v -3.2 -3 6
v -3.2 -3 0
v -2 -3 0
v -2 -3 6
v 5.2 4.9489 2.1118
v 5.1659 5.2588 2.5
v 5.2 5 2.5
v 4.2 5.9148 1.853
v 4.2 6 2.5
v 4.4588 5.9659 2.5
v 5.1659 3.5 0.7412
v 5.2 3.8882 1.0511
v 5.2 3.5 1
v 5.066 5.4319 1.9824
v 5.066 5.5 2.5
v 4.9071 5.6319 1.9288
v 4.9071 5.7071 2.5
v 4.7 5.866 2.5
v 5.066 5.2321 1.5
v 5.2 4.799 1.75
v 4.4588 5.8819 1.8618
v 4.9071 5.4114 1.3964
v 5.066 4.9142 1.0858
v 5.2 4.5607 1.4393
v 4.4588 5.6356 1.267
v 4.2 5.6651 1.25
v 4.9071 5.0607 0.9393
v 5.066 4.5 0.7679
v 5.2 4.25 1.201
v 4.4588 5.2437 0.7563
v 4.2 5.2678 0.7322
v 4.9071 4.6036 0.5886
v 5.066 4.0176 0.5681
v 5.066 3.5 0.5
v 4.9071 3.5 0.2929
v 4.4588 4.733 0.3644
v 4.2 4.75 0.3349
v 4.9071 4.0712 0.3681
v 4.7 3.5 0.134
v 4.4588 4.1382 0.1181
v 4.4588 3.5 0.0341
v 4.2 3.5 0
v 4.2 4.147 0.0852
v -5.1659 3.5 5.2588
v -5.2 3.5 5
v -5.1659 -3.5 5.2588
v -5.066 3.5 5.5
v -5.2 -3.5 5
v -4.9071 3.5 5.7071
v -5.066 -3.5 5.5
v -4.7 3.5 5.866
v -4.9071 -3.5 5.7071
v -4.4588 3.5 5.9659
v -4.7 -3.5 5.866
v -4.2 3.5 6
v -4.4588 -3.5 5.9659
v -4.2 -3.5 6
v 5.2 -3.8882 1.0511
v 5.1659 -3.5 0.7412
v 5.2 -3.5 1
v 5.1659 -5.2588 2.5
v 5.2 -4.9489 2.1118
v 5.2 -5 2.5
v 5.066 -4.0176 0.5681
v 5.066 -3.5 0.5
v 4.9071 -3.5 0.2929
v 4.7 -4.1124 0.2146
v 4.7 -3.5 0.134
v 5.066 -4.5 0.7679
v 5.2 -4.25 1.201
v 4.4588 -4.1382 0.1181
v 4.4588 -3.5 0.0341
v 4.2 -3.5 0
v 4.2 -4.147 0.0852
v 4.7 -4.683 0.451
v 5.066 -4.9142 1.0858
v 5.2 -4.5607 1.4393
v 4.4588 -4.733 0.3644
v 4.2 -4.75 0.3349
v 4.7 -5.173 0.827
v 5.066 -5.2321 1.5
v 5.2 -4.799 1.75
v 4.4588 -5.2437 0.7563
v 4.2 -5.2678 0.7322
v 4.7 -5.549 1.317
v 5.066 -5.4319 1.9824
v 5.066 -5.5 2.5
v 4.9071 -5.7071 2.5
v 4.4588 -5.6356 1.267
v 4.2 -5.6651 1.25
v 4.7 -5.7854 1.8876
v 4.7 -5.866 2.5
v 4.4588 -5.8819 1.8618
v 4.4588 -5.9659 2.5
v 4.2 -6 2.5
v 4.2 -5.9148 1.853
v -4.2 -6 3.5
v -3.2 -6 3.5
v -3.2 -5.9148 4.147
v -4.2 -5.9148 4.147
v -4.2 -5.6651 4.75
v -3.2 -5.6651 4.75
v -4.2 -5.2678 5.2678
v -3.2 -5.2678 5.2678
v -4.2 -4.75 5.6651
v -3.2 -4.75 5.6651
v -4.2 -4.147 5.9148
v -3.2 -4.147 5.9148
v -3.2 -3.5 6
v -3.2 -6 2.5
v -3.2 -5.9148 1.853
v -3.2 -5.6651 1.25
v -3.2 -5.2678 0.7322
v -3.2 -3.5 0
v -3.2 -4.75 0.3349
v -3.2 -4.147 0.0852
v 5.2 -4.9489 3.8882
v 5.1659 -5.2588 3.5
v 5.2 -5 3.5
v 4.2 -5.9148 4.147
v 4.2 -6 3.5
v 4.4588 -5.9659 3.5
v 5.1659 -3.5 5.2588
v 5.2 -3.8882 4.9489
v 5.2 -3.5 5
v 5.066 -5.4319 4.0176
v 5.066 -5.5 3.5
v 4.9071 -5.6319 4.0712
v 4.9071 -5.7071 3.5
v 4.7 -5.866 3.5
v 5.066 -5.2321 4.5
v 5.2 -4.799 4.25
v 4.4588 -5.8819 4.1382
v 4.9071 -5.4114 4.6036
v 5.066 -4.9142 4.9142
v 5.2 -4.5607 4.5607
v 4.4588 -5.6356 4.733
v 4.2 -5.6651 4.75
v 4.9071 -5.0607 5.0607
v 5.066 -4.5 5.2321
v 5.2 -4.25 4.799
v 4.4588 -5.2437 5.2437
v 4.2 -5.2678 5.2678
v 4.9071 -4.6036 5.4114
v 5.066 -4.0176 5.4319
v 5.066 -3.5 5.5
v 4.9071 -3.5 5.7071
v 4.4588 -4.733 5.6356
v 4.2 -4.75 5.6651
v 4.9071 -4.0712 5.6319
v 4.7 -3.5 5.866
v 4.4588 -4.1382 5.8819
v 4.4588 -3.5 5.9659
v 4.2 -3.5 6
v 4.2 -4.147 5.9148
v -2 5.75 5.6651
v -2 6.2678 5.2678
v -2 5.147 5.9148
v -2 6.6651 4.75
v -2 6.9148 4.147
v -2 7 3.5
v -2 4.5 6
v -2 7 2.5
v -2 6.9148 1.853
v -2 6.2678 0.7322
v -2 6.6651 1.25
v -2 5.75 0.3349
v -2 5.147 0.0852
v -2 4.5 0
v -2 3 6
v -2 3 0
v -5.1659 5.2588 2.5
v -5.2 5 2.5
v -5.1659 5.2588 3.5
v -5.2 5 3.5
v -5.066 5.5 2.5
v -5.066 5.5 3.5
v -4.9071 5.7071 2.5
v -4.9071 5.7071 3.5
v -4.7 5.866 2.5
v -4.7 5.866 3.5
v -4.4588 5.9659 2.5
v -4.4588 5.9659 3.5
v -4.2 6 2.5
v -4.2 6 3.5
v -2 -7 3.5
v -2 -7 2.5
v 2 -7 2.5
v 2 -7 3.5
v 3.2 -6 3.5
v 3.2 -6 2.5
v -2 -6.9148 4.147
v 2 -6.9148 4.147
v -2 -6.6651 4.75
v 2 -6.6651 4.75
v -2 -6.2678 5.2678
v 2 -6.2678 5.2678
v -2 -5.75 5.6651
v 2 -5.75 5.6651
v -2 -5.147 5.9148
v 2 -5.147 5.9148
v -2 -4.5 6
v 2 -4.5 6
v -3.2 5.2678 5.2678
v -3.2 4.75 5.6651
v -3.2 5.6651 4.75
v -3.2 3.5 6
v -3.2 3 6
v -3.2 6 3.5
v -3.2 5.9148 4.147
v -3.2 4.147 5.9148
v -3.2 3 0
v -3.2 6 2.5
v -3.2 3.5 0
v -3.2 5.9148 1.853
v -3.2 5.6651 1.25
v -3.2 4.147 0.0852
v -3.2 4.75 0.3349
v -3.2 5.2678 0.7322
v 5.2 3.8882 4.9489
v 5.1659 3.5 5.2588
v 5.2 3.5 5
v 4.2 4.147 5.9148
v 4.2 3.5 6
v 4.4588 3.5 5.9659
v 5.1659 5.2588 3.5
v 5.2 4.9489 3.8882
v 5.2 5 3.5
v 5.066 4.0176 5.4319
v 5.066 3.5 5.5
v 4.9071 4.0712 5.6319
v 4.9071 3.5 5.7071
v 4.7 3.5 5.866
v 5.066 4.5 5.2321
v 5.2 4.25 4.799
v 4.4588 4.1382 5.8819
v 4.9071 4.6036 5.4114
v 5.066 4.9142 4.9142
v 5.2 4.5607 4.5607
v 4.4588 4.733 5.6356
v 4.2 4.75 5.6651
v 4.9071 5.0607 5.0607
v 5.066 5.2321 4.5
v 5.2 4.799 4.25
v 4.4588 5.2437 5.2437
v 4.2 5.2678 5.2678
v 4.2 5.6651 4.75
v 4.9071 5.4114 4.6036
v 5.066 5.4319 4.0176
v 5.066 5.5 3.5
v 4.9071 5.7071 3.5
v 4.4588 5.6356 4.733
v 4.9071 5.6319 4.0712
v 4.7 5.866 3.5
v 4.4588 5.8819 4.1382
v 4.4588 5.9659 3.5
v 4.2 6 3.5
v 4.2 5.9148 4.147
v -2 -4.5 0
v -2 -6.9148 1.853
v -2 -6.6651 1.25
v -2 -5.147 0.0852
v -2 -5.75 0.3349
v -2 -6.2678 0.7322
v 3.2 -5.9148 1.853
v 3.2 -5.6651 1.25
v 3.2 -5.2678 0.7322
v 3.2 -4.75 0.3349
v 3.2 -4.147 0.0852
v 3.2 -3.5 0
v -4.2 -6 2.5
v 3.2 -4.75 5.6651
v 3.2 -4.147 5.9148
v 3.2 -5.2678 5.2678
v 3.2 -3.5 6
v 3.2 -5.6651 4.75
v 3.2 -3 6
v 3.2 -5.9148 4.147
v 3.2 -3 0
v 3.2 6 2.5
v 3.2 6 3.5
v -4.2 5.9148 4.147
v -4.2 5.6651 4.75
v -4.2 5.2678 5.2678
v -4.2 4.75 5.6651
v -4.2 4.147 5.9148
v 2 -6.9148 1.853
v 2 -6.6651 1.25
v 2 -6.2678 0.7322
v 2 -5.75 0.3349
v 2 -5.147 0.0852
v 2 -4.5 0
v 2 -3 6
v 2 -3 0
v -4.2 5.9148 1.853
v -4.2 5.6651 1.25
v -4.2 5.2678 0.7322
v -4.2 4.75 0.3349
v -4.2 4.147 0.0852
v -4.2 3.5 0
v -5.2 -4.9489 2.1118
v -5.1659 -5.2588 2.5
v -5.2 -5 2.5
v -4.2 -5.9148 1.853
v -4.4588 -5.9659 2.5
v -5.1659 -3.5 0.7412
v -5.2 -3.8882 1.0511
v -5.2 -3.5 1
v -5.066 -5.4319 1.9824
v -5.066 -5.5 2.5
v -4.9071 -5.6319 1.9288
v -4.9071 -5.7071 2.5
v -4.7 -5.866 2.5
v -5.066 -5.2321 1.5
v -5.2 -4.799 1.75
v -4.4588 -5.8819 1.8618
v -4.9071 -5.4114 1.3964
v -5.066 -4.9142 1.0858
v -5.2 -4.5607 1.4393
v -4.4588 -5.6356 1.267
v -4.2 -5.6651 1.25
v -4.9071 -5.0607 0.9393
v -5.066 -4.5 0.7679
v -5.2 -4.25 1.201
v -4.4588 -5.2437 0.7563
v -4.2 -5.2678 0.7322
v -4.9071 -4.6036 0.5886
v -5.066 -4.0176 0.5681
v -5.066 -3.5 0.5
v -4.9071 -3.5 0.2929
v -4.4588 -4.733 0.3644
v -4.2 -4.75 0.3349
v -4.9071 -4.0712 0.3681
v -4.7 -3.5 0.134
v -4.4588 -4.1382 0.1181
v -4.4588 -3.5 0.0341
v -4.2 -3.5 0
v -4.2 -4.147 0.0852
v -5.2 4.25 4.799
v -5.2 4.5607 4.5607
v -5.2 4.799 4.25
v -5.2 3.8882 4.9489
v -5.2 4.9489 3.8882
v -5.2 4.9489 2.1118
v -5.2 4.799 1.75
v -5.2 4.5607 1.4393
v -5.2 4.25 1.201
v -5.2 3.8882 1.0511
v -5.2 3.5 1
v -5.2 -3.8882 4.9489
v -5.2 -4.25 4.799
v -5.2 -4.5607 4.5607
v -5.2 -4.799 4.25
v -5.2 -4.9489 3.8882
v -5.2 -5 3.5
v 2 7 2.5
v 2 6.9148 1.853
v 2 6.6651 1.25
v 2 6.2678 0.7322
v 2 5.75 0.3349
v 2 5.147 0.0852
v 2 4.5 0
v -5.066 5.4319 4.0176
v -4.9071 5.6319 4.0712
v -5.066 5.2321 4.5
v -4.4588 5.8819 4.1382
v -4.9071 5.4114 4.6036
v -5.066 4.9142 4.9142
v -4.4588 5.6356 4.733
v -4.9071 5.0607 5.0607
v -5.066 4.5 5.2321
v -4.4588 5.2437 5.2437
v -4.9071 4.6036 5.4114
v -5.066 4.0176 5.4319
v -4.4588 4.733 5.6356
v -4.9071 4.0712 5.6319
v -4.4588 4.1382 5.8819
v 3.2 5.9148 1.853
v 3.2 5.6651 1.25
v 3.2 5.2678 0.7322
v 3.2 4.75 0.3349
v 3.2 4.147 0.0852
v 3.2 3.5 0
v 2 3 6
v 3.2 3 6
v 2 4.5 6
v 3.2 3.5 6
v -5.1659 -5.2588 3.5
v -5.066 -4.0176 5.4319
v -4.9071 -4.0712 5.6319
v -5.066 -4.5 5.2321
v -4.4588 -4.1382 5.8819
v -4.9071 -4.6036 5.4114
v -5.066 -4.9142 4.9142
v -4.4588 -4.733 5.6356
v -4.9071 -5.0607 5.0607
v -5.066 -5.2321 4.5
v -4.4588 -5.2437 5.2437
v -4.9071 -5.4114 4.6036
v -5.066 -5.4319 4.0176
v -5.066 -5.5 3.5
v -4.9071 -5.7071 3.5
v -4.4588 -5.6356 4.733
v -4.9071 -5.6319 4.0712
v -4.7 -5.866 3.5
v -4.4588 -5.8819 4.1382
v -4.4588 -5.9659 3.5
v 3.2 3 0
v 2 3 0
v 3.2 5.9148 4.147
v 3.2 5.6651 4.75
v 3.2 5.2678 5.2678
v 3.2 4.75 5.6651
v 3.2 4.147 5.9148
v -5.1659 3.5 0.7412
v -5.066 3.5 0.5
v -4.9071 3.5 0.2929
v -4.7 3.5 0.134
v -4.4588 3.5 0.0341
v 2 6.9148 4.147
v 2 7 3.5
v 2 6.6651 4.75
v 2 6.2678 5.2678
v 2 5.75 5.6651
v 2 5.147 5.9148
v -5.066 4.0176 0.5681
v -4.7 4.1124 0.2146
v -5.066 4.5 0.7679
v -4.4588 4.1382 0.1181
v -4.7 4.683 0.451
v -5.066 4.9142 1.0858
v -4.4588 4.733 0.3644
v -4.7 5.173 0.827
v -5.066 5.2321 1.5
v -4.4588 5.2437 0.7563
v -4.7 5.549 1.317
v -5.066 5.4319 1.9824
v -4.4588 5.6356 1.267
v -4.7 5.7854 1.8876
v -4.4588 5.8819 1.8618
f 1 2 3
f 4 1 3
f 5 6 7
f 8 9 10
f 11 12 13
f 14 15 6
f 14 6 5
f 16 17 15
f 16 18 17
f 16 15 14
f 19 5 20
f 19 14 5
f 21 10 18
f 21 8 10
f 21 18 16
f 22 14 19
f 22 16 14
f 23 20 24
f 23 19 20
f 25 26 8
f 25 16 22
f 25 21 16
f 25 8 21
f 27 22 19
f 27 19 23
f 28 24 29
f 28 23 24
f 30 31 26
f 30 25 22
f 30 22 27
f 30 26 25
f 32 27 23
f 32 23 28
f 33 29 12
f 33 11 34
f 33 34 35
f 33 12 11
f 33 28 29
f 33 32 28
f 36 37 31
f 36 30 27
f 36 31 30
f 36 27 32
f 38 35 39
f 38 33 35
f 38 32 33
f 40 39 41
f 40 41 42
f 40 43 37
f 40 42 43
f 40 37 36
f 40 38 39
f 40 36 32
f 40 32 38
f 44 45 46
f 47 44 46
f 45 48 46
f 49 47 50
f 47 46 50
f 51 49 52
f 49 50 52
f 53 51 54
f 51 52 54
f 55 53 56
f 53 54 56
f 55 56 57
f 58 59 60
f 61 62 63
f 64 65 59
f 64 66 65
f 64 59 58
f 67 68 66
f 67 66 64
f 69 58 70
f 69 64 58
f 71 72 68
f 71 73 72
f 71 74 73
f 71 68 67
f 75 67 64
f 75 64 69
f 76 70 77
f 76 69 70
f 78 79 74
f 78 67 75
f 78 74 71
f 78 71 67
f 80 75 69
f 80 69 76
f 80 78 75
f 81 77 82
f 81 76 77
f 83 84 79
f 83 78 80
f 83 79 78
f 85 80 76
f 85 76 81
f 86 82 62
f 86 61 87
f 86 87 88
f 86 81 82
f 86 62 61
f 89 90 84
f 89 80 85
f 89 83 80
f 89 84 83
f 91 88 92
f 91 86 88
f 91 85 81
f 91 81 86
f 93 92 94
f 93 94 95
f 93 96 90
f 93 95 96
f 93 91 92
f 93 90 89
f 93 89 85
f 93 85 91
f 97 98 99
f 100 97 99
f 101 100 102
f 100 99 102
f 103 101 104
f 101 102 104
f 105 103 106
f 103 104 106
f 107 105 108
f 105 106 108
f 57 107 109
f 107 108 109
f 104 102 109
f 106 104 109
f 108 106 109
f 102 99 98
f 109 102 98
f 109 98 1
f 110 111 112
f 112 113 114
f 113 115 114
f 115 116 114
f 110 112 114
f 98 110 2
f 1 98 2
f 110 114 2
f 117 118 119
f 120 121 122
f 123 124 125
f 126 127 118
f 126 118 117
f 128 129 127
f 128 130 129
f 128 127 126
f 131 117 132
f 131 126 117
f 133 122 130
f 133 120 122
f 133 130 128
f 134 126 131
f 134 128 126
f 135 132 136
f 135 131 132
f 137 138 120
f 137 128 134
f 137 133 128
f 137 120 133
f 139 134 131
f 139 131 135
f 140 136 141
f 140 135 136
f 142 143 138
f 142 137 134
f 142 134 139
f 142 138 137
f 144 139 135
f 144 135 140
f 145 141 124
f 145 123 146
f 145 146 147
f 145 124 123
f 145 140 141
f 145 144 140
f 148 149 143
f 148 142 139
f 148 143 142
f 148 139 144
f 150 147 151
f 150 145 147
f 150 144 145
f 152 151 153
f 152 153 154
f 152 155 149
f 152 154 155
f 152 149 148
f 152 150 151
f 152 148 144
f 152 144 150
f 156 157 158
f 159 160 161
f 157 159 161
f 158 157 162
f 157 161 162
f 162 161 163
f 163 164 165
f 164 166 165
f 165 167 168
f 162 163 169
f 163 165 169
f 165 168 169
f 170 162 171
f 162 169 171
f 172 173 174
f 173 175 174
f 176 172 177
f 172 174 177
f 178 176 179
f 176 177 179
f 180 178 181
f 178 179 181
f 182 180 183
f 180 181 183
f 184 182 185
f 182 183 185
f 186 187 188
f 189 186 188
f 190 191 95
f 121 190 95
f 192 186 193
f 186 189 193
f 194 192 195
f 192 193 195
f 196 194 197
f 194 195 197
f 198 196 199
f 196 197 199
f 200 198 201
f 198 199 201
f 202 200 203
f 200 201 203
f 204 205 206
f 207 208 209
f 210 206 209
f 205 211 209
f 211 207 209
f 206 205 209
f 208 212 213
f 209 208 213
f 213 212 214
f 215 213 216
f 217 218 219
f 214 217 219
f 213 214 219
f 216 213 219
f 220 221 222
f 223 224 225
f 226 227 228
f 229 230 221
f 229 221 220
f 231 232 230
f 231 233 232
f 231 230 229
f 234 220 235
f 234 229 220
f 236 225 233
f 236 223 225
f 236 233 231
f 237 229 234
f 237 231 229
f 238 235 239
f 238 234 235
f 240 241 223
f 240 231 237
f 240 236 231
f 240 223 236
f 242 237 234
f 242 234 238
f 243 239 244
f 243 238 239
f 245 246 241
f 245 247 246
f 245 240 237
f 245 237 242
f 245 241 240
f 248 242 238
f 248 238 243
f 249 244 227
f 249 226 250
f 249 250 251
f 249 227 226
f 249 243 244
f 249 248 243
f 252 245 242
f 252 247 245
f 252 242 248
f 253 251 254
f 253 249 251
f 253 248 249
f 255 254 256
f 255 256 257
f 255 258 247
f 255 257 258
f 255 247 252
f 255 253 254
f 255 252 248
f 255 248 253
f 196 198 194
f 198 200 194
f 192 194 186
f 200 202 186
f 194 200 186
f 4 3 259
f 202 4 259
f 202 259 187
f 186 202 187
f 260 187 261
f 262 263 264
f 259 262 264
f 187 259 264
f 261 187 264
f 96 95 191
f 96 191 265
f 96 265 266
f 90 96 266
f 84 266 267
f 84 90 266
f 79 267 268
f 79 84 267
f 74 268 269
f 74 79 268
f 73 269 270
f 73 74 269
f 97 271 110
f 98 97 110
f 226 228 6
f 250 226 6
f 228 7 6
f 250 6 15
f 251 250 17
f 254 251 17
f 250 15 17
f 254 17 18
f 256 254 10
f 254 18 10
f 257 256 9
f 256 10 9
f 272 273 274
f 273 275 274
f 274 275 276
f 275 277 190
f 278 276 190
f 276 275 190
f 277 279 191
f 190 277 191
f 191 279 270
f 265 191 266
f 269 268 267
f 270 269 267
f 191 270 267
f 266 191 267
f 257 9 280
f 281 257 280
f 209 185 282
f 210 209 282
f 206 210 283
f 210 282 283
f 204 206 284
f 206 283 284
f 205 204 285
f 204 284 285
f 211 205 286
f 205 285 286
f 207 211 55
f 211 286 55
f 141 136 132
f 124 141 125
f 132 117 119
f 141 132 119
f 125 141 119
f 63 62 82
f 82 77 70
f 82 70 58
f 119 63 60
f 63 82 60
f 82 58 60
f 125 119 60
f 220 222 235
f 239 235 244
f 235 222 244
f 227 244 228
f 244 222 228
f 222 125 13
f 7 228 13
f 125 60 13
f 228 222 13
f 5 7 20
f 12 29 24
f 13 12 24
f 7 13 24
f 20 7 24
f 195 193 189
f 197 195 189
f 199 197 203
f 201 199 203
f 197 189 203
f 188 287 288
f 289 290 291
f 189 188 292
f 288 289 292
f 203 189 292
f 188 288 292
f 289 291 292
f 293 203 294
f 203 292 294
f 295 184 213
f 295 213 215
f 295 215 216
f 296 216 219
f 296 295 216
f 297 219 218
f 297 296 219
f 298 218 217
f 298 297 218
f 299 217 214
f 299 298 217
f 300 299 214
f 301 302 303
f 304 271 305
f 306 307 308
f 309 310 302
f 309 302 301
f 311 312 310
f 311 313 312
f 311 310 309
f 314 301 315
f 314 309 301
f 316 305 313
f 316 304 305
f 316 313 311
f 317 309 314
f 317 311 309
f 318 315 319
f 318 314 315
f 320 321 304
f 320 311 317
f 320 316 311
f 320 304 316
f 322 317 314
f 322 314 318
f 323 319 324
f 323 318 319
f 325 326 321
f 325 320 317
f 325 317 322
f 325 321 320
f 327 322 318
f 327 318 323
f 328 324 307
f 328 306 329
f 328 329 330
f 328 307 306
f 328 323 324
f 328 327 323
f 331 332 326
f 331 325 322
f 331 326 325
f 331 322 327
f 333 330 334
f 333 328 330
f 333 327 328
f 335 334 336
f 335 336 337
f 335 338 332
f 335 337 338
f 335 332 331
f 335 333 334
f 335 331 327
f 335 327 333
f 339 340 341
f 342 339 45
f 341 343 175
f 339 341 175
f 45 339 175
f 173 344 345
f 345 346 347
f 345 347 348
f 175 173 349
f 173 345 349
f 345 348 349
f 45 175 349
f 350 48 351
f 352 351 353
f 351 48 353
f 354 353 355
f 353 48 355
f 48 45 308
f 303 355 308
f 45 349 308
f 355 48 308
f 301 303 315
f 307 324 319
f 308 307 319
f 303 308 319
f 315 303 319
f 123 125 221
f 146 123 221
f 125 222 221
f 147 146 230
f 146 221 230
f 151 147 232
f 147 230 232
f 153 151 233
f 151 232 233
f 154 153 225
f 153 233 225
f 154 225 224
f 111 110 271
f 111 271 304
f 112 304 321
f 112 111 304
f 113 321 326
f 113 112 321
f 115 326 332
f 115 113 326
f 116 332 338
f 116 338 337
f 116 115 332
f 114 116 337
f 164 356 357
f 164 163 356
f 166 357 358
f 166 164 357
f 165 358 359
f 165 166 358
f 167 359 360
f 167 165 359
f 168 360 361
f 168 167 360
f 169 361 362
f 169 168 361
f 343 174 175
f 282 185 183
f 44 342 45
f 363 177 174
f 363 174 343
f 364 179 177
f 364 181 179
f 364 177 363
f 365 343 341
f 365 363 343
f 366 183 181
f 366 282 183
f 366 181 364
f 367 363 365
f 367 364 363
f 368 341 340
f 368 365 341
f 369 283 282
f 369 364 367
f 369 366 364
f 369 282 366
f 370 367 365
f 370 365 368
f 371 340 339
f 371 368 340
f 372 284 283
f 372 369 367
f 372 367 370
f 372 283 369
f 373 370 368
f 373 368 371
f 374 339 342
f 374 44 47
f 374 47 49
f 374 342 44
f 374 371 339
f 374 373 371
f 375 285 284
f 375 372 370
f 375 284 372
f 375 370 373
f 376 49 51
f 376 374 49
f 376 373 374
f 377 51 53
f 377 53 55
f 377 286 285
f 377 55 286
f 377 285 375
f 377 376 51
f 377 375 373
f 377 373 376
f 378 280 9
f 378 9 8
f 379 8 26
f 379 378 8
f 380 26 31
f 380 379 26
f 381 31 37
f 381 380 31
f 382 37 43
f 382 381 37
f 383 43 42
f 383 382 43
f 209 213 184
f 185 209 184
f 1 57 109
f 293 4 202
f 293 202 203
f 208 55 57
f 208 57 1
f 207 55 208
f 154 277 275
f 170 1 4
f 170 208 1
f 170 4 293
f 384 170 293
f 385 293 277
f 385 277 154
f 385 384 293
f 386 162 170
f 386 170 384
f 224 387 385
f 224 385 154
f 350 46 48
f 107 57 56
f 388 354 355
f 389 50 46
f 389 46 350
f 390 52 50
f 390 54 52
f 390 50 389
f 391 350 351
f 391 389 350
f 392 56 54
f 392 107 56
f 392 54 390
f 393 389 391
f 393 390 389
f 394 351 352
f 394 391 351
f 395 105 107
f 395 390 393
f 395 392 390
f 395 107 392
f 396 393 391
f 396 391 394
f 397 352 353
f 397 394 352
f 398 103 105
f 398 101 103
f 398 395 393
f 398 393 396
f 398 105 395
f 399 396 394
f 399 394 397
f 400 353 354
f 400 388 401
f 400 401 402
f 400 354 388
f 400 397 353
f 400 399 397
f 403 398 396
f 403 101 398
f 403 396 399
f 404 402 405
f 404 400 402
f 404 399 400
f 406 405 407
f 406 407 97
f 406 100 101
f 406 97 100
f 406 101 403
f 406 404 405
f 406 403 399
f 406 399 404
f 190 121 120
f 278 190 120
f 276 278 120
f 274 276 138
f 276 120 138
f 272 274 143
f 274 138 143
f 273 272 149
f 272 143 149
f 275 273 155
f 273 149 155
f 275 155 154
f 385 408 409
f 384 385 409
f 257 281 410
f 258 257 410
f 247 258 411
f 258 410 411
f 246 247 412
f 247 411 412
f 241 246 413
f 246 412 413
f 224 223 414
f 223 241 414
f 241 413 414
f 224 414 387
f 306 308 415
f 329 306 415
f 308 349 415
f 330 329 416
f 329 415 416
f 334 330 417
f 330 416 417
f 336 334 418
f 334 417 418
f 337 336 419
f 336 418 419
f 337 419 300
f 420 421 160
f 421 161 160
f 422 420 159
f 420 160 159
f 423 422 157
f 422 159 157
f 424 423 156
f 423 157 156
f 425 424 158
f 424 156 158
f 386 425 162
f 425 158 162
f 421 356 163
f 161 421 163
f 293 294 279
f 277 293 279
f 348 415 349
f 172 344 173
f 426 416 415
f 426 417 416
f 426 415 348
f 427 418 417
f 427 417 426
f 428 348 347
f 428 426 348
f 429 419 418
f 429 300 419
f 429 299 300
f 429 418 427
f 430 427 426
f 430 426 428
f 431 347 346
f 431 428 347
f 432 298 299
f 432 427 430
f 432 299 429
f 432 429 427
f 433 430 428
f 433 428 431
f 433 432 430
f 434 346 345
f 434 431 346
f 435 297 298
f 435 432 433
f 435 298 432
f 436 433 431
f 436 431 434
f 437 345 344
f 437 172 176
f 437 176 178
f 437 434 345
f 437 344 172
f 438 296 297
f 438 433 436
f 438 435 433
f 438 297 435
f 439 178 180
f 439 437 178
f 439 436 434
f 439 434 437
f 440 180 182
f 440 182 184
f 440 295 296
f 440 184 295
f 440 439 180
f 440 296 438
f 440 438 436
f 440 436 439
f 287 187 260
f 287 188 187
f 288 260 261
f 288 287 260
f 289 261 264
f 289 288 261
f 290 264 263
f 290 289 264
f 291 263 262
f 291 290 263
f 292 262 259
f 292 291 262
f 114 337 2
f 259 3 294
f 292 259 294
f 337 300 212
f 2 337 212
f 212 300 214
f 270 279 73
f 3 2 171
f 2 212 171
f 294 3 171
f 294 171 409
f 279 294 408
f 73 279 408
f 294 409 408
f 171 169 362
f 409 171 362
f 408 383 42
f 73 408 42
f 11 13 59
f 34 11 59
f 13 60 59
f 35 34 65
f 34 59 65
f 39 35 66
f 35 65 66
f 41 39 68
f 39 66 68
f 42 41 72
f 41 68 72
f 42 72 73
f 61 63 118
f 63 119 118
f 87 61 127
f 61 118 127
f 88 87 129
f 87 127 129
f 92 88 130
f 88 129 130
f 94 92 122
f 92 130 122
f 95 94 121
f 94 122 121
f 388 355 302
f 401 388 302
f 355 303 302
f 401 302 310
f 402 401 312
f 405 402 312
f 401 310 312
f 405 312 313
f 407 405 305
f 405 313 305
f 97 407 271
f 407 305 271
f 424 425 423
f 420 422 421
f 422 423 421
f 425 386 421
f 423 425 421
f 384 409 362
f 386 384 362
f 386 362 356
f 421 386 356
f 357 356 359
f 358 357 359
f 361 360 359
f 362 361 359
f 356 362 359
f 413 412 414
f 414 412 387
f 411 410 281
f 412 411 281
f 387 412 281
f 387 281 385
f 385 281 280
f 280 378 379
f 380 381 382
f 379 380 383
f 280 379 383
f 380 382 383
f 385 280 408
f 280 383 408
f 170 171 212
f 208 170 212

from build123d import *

# Parameters (mm, degrees)
PAD_DEPTH   = 6
FILLET_R    = 2.5
FILLET001_R = 1


with BuildPart() as part:
    # Sketch → Pad (new body)
    with BuildSketch(Plane.XY):
        Polygon((0, 7), (-2, 7), (-2, 3), (-3.2, 3), (-3.2, 6), (-5.2, 6), (-5.2, 0), (-5.2, -6), (-3.2, -6), (-3.2, -3), (-2, -3), (-2, -7), (0, -7), (2, -7), (2, -3), (3.2, -3), (3.2, -6), (5.2, -6), (5.2, 0), (5.2, 6), (3.2, 6), (3.2, 3), (2, 3), (2, 7), align=None)
    extrude(amount=PAD_DEPTH)

    # Fillet
    fillet_edges = [part.edges().sort_by_distance(p)[0] for p in [
        (-4.2, 6, 6),
        (-4.2, 6, 0),
        (-4.2, -6, 0),
        (-4.2, -6, 6),
        (4.2, -6, 0),
        (4.2, -6, 6),
        (4.2, 6, 6),
        (4.2, 6, 0),
        (0, 7, 0),
        (0, -7, 0),
        (0, -7, 6),
        (0, 7, 6),
    ]]
    fillet(fillet_edges, radius=FILLET_R)

    # Fillet001
    fillet001_edges = [part.edges().sort_by_distance(p)[0] for p in [
        (-5.2, 6, 3),
        (-5.2, 5.267767, 0.732233),
        (-5.2, 5.267767, 5.267767),
        (-5.2, 0, 0),
        (-5.2, 0, 6),
        (-5.2, -5.267767, 0.732233),
        (-5.2, -5.267767, 5.267767),
        (-5.2, -6, 3),
        (5.2, -6, 3),
        (5.2, -5.267767, 0.732233),
        (5.2, -5.267767, 5.267767),
        (5.2, 0, 0),
        (5.2, 0, 6),
        (5.2, 5.267767, 0.732233),
        (5.2, 5.267767, 5.267767),
        (5.2, 6, 3),
    ]]
    fillet(fillet001_edges, radius=FILLET001_R)


solid = part.part
